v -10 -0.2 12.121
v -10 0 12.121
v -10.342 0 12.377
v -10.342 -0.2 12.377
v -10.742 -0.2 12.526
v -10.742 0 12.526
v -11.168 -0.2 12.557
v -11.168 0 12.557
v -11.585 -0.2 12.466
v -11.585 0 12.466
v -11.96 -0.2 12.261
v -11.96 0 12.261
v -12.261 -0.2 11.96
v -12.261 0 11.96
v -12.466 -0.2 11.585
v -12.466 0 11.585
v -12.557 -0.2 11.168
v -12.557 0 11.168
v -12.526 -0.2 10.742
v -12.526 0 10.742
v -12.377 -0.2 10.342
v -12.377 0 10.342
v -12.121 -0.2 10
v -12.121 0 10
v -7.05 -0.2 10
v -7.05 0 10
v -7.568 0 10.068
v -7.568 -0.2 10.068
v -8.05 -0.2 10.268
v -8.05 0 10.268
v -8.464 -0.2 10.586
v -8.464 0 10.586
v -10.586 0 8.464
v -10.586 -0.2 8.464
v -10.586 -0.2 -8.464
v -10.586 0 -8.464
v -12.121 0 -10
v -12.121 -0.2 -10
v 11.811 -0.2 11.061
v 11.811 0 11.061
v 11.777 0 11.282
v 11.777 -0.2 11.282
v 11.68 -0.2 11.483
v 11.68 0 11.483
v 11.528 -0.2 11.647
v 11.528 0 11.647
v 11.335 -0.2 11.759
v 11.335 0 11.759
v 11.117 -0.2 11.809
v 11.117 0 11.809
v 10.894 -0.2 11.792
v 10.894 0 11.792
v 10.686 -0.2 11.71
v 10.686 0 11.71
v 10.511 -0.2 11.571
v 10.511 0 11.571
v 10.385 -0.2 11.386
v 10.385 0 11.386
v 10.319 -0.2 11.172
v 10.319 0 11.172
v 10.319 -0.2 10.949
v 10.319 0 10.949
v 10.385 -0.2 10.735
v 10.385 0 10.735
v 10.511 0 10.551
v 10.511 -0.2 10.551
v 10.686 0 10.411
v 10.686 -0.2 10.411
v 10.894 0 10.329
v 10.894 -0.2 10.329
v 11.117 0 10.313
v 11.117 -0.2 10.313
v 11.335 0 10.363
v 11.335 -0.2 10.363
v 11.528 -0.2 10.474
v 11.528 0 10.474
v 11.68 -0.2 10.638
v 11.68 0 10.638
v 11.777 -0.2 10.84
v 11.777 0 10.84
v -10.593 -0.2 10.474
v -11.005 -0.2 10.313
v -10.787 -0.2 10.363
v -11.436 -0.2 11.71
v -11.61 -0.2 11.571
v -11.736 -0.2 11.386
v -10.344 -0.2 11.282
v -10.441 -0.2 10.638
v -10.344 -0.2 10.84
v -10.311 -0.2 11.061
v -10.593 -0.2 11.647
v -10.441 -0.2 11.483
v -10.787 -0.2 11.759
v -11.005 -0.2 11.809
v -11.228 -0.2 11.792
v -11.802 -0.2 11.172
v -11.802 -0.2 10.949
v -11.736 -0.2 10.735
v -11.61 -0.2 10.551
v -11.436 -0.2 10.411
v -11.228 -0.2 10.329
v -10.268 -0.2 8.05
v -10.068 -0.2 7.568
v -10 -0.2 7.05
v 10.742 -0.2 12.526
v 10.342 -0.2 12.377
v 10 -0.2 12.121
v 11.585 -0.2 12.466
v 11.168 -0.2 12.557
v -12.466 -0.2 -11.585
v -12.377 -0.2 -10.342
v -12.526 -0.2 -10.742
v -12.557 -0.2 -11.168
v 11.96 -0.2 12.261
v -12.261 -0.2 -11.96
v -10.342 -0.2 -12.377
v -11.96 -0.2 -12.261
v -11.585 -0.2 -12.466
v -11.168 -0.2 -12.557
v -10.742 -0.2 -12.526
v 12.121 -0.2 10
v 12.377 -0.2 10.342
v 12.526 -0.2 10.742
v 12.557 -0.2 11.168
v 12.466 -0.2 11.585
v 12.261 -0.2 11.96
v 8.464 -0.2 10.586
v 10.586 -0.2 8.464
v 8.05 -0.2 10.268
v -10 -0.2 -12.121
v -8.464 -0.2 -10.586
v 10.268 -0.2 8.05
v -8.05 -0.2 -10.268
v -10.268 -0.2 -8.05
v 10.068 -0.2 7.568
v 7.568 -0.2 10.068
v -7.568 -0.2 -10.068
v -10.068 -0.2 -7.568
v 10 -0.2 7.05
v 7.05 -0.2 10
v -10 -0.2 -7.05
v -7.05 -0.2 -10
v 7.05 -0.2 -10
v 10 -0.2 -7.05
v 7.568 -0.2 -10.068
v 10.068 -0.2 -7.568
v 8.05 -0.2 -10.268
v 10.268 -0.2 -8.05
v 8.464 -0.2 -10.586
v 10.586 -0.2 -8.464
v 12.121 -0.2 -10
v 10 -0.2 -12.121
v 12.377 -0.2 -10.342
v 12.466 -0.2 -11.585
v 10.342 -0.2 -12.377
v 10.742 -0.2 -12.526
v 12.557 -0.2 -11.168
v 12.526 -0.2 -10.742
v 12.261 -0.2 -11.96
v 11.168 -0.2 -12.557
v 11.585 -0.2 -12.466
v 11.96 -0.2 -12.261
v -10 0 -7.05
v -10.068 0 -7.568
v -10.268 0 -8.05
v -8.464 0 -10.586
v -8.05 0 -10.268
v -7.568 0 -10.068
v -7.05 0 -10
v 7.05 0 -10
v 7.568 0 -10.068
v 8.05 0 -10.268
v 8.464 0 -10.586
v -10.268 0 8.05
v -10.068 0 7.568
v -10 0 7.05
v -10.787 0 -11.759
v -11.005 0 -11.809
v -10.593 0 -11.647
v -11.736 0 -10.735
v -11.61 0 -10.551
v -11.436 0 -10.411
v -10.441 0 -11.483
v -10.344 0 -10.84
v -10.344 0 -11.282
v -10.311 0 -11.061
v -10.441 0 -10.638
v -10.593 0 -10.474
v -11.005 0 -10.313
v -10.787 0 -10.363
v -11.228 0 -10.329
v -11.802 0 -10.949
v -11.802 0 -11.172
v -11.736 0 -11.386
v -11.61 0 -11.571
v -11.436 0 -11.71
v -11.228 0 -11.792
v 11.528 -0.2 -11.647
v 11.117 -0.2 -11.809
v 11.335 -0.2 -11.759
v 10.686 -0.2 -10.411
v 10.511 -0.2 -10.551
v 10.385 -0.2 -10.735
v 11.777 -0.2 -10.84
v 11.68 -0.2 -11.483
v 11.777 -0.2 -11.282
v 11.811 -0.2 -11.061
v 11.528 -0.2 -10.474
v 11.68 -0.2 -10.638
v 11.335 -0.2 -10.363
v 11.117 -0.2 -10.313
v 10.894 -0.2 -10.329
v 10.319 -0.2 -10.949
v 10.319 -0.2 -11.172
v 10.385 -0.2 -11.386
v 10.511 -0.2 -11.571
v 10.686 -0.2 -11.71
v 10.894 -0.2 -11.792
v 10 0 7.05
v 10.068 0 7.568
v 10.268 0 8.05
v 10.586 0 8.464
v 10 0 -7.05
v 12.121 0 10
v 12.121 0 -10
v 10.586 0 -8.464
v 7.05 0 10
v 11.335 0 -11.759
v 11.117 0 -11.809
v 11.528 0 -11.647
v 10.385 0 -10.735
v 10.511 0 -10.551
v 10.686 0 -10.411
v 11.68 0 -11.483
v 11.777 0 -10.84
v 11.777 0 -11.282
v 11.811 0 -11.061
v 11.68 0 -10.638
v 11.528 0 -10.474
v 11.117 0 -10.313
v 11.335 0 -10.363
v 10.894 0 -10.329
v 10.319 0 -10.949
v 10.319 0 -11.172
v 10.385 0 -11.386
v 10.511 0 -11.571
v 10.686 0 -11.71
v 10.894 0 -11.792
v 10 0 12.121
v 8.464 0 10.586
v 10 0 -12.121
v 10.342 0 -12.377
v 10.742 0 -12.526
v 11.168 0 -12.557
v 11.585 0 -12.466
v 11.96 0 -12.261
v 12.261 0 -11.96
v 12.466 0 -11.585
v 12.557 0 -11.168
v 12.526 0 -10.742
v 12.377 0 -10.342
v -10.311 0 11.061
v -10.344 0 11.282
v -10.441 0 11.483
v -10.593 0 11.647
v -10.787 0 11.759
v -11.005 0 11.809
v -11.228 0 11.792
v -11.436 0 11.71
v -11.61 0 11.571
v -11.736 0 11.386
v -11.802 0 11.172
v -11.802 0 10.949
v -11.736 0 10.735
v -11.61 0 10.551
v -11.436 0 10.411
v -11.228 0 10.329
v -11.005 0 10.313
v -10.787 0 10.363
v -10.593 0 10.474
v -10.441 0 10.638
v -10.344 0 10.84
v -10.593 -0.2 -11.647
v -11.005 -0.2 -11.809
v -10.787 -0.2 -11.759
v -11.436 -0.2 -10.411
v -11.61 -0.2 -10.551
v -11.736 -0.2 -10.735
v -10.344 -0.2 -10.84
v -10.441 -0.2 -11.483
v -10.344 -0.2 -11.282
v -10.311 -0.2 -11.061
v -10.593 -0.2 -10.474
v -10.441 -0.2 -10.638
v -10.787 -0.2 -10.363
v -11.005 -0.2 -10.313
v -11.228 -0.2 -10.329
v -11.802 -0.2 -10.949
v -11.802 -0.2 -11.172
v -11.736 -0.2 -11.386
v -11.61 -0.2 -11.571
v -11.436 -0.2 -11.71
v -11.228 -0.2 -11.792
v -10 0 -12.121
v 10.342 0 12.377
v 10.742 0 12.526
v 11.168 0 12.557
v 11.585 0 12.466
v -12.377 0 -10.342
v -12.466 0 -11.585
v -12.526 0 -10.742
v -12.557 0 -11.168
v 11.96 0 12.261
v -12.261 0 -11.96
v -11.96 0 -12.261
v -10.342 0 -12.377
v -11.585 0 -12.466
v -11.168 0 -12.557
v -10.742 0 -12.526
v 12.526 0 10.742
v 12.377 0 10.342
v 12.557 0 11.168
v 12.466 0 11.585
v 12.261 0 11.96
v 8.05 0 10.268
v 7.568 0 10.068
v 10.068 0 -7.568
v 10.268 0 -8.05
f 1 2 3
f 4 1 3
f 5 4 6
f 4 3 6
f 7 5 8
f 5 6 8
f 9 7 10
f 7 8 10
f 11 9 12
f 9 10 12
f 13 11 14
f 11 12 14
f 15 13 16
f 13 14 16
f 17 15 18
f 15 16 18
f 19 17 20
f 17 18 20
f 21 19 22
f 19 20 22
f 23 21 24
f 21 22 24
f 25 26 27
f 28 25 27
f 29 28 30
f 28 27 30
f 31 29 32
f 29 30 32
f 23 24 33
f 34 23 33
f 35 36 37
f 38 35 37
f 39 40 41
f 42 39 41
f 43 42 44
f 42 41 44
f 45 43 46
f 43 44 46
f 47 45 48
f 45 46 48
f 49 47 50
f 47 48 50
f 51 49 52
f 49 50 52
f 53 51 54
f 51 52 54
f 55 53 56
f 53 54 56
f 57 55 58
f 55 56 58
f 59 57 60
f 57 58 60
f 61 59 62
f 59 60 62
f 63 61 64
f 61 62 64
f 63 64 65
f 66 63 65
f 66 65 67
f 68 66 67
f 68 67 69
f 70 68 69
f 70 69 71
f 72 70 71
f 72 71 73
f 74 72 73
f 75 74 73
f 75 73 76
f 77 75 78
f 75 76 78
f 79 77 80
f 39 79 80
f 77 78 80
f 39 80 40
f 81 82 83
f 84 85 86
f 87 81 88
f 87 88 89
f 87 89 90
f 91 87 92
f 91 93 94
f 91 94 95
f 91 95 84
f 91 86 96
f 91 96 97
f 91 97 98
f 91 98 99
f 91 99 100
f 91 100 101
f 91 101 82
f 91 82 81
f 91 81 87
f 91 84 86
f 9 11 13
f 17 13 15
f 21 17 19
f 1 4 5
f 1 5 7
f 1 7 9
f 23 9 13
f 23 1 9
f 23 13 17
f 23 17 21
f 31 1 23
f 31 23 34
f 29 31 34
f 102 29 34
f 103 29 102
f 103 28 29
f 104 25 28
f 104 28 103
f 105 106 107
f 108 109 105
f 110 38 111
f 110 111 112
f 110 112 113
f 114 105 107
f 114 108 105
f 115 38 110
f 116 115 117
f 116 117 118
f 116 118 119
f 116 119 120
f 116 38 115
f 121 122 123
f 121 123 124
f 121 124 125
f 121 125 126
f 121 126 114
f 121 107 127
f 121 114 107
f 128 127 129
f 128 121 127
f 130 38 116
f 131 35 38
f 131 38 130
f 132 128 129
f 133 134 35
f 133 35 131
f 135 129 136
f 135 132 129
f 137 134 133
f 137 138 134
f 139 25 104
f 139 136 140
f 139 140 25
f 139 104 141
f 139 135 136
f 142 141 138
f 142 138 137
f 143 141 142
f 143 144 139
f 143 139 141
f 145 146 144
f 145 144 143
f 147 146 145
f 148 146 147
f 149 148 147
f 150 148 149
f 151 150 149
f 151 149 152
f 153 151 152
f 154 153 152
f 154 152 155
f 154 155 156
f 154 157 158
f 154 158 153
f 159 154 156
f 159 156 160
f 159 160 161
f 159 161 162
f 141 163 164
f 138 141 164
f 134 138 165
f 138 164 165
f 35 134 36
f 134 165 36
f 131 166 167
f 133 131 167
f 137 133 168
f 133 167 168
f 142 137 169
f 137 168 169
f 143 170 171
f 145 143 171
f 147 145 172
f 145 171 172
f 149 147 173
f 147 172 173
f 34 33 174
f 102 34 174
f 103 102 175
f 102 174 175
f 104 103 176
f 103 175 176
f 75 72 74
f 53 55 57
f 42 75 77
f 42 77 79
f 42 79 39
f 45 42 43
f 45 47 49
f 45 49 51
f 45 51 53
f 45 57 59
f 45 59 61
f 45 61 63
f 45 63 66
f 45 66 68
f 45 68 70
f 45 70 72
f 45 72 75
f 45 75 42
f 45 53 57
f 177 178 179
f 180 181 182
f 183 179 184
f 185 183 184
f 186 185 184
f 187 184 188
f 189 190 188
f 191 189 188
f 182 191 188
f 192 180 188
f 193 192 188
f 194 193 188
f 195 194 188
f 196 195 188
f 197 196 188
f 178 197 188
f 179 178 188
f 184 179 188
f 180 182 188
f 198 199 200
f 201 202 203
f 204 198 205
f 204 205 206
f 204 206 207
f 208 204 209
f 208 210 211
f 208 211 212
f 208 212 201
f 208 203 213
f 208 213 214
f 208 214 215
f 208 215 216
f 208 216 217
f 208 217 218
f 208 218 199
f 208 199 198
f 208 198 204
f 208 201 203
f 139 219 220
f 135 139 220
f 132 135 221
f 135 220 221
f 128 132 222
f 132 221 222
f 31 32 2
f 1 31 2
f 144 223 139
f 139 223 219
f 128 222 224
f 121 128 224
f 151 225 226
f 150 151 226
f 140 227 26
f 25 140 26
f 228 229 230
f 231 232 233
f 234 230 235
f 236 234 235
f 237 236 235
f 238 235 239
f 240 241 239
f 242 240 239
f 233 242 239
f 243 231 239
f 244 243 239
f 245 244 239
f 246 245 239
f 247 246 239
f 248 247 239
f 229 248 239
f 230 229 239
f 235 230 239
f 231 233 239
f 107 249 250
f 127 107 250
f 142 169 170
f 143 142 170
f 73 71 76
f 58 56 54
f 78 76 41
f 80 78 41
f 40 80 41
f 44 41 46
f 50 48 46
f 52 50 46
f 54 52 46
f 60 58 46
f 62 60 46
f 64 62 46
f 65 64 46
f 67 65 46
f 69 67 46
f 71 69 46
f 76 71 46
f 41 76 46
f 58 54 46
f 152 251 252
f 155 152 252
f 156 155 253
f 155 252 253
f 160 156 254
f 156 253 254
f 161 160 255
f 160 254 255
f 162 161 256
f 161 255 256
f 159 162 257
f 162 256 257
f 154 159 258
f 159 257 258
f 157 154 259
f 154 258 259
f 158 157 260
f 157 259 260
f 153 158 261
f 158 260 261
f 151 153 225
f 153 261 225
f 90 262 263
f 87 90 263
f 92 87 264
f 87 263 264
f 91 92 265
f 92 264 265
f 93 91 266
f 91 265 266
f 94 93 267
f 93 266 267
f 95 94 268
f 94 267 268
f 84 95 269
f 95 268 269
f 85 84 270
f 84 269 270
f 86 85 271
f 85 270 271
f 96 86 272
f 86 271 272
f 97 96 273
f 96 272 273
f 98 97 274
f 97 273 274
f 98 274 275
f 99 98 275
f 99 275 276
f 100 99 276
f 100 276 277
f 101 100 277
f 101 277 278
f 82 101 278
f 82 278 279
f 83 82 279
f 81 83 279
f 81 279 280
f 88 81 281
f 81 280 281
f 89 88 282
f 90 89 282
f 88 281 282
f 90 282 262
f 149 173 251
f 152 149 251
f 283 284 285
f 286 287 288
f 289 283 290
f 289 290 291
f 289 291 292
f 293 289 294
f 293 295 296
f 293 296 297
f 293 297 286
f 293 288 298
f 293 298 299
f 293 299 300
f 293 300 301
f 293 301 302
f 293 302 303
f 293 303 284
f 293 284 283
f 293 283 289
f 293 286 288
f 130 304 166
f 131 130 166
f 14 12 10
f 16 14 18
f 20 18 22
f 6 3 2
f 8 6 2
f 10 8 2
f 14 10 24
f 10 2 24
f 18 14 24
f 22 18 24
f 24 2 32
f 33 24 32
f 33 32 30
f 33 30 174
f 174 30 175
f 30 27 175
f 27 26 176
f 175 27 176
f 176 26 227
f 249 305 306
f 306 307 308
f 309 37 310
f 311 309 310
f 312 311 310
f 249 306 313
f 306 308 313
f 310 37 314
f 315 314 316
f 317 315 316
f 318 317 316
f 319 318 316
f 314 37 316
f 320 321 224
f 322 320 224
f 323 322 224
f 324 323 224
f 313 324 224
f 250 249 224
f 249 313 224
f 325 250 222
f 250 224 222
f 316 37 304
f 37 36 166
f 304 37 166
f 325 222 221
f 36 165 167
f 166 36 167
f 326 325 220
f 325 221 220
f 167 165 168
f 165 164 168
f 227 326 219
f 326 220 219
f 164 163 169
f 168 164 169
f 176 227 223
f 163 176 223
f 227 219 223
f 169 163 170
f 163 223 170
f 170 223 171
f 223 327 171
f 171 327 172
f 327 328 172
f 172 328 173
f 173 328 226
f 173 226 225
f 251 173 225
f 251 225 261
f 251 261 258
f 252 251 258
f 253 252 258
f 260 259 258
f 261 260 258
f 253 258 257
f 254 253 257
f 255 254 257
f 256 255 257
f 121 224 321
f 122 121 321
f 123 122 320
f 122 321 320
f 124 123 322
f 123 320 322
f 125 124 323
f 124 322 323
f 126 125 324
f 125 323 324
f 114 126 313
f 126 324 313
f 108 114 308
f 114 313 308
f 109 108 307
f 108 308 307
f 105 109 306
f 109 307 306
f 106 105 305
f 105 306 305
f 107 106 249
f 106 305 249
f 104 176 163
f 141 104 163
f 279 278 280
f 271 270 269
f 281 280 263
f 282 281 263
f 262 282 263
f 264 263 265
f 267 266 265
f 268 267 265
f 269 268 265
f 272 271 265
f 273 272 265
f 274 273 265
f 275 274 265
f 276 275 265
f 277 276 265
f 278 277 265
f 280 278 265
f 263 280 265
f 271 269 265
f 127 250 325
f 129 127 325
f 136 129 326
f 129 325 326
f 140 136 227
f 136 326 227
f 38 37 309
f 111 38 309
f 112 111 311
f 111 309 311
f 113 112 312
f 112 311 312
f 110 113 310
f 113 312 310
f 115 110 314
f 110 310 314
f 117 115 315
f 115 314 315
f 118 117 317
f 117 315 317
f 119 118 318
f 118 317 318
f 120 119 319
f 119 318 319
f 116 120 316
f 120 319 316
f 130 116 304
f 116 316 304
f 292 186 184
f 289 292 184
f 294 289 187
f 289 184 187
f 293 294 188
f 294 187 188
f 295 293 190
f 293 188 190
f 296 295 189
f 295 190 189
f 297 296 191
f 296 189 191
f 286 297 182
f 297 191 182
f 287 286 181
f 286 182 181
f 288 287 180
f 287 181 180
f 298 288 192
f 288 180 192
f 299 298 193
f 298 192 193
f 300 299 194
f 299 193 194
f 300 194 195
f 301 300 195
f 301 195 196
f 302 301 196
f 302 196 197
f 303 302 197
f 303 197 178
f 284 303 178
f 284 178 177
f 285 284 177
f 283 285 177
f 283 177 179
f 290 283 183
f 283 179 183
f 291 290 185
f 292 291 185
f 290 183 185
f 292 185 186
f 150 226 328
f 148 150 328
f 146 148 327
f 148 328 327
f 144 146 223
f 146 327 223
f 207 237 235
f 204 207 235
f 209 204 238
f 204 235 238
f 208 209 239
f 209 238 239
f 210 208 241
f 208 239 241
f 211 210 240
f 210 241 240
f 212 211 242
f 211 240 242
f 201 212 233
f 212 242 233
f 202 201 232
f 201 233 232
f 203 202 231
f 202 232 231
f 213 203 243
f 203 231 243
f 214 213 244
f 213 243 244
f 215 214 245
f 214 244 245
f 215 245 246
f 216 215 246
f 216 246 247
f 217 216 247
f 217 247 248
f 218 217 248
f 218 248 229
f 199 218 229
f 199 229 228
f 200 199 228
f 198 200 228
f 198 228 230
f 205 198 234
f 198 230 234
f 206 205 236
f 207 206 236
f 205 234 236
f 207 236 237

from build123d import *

# Parameters (mm, degrees)
F1_DEPTH = 0.2
F2_COUNT = 4
F3_R     = 0.75
F4_DEPTH = 0.2


with BuildPart() as f1:
    # F0 (on Front) → F1 (new body)
    with BuildSketch(Plane.XZ):
        with BuildLine():
            Line((0, 0), (0, 10))
            Line((0, 10), (-7.050253, 10))
            ThreePointArc((-7.050253, 10), (-7.815619, 10.152241), (-8.464466, 10.585786))
            Line((-8.464466, 10.585786), (-10, 12.12132))
            ThreePointArc((-10, 12.12132), (-12.12132, 12.12132), (-12.12132, 10))
            Line((-12.12132, 10), (-10.585786, 8.464466))
            ThreePointArc((-10.585786, 8.464466), (-10.152241, 7.815619), (-10, 7.050253))
            Line((-10, 7.050253), (-10, 0))
            Line((-10, 0), (0, 0))
        make_face()
    extrude(amount=F1_DEPTH)

    # F2: F1 ×4 about axis
    f2_axis = Axis((0, -0.1, 0), (0, -1, 0))


with BuildPart() as f1_1:
    add(f1.part)
    for i in range(1, F2_COUNT):
        add(f1.part.rotate(f2_axis, i * 360 / F2_COUNT))


with BuildPart() as f4:
    # F3 (on Front) → F4 (new body, through all)
    with BuildSketch(Plane.XZ):
        with Locations((-11.06066, -11.06066)):
            Circle(F3_R)
        with Locations((11.06066, -11.06066)):
            Circle(F3_R)
        with Locations((11.06066, 11.06066)):
            Circle(F3_R)
        with Locations((-11.06066, 11.06066)):
            Circle(F3_R)
    extrude(amount=F4_DEPTH)


solid = Compound([f1_1.part, f4.part])
